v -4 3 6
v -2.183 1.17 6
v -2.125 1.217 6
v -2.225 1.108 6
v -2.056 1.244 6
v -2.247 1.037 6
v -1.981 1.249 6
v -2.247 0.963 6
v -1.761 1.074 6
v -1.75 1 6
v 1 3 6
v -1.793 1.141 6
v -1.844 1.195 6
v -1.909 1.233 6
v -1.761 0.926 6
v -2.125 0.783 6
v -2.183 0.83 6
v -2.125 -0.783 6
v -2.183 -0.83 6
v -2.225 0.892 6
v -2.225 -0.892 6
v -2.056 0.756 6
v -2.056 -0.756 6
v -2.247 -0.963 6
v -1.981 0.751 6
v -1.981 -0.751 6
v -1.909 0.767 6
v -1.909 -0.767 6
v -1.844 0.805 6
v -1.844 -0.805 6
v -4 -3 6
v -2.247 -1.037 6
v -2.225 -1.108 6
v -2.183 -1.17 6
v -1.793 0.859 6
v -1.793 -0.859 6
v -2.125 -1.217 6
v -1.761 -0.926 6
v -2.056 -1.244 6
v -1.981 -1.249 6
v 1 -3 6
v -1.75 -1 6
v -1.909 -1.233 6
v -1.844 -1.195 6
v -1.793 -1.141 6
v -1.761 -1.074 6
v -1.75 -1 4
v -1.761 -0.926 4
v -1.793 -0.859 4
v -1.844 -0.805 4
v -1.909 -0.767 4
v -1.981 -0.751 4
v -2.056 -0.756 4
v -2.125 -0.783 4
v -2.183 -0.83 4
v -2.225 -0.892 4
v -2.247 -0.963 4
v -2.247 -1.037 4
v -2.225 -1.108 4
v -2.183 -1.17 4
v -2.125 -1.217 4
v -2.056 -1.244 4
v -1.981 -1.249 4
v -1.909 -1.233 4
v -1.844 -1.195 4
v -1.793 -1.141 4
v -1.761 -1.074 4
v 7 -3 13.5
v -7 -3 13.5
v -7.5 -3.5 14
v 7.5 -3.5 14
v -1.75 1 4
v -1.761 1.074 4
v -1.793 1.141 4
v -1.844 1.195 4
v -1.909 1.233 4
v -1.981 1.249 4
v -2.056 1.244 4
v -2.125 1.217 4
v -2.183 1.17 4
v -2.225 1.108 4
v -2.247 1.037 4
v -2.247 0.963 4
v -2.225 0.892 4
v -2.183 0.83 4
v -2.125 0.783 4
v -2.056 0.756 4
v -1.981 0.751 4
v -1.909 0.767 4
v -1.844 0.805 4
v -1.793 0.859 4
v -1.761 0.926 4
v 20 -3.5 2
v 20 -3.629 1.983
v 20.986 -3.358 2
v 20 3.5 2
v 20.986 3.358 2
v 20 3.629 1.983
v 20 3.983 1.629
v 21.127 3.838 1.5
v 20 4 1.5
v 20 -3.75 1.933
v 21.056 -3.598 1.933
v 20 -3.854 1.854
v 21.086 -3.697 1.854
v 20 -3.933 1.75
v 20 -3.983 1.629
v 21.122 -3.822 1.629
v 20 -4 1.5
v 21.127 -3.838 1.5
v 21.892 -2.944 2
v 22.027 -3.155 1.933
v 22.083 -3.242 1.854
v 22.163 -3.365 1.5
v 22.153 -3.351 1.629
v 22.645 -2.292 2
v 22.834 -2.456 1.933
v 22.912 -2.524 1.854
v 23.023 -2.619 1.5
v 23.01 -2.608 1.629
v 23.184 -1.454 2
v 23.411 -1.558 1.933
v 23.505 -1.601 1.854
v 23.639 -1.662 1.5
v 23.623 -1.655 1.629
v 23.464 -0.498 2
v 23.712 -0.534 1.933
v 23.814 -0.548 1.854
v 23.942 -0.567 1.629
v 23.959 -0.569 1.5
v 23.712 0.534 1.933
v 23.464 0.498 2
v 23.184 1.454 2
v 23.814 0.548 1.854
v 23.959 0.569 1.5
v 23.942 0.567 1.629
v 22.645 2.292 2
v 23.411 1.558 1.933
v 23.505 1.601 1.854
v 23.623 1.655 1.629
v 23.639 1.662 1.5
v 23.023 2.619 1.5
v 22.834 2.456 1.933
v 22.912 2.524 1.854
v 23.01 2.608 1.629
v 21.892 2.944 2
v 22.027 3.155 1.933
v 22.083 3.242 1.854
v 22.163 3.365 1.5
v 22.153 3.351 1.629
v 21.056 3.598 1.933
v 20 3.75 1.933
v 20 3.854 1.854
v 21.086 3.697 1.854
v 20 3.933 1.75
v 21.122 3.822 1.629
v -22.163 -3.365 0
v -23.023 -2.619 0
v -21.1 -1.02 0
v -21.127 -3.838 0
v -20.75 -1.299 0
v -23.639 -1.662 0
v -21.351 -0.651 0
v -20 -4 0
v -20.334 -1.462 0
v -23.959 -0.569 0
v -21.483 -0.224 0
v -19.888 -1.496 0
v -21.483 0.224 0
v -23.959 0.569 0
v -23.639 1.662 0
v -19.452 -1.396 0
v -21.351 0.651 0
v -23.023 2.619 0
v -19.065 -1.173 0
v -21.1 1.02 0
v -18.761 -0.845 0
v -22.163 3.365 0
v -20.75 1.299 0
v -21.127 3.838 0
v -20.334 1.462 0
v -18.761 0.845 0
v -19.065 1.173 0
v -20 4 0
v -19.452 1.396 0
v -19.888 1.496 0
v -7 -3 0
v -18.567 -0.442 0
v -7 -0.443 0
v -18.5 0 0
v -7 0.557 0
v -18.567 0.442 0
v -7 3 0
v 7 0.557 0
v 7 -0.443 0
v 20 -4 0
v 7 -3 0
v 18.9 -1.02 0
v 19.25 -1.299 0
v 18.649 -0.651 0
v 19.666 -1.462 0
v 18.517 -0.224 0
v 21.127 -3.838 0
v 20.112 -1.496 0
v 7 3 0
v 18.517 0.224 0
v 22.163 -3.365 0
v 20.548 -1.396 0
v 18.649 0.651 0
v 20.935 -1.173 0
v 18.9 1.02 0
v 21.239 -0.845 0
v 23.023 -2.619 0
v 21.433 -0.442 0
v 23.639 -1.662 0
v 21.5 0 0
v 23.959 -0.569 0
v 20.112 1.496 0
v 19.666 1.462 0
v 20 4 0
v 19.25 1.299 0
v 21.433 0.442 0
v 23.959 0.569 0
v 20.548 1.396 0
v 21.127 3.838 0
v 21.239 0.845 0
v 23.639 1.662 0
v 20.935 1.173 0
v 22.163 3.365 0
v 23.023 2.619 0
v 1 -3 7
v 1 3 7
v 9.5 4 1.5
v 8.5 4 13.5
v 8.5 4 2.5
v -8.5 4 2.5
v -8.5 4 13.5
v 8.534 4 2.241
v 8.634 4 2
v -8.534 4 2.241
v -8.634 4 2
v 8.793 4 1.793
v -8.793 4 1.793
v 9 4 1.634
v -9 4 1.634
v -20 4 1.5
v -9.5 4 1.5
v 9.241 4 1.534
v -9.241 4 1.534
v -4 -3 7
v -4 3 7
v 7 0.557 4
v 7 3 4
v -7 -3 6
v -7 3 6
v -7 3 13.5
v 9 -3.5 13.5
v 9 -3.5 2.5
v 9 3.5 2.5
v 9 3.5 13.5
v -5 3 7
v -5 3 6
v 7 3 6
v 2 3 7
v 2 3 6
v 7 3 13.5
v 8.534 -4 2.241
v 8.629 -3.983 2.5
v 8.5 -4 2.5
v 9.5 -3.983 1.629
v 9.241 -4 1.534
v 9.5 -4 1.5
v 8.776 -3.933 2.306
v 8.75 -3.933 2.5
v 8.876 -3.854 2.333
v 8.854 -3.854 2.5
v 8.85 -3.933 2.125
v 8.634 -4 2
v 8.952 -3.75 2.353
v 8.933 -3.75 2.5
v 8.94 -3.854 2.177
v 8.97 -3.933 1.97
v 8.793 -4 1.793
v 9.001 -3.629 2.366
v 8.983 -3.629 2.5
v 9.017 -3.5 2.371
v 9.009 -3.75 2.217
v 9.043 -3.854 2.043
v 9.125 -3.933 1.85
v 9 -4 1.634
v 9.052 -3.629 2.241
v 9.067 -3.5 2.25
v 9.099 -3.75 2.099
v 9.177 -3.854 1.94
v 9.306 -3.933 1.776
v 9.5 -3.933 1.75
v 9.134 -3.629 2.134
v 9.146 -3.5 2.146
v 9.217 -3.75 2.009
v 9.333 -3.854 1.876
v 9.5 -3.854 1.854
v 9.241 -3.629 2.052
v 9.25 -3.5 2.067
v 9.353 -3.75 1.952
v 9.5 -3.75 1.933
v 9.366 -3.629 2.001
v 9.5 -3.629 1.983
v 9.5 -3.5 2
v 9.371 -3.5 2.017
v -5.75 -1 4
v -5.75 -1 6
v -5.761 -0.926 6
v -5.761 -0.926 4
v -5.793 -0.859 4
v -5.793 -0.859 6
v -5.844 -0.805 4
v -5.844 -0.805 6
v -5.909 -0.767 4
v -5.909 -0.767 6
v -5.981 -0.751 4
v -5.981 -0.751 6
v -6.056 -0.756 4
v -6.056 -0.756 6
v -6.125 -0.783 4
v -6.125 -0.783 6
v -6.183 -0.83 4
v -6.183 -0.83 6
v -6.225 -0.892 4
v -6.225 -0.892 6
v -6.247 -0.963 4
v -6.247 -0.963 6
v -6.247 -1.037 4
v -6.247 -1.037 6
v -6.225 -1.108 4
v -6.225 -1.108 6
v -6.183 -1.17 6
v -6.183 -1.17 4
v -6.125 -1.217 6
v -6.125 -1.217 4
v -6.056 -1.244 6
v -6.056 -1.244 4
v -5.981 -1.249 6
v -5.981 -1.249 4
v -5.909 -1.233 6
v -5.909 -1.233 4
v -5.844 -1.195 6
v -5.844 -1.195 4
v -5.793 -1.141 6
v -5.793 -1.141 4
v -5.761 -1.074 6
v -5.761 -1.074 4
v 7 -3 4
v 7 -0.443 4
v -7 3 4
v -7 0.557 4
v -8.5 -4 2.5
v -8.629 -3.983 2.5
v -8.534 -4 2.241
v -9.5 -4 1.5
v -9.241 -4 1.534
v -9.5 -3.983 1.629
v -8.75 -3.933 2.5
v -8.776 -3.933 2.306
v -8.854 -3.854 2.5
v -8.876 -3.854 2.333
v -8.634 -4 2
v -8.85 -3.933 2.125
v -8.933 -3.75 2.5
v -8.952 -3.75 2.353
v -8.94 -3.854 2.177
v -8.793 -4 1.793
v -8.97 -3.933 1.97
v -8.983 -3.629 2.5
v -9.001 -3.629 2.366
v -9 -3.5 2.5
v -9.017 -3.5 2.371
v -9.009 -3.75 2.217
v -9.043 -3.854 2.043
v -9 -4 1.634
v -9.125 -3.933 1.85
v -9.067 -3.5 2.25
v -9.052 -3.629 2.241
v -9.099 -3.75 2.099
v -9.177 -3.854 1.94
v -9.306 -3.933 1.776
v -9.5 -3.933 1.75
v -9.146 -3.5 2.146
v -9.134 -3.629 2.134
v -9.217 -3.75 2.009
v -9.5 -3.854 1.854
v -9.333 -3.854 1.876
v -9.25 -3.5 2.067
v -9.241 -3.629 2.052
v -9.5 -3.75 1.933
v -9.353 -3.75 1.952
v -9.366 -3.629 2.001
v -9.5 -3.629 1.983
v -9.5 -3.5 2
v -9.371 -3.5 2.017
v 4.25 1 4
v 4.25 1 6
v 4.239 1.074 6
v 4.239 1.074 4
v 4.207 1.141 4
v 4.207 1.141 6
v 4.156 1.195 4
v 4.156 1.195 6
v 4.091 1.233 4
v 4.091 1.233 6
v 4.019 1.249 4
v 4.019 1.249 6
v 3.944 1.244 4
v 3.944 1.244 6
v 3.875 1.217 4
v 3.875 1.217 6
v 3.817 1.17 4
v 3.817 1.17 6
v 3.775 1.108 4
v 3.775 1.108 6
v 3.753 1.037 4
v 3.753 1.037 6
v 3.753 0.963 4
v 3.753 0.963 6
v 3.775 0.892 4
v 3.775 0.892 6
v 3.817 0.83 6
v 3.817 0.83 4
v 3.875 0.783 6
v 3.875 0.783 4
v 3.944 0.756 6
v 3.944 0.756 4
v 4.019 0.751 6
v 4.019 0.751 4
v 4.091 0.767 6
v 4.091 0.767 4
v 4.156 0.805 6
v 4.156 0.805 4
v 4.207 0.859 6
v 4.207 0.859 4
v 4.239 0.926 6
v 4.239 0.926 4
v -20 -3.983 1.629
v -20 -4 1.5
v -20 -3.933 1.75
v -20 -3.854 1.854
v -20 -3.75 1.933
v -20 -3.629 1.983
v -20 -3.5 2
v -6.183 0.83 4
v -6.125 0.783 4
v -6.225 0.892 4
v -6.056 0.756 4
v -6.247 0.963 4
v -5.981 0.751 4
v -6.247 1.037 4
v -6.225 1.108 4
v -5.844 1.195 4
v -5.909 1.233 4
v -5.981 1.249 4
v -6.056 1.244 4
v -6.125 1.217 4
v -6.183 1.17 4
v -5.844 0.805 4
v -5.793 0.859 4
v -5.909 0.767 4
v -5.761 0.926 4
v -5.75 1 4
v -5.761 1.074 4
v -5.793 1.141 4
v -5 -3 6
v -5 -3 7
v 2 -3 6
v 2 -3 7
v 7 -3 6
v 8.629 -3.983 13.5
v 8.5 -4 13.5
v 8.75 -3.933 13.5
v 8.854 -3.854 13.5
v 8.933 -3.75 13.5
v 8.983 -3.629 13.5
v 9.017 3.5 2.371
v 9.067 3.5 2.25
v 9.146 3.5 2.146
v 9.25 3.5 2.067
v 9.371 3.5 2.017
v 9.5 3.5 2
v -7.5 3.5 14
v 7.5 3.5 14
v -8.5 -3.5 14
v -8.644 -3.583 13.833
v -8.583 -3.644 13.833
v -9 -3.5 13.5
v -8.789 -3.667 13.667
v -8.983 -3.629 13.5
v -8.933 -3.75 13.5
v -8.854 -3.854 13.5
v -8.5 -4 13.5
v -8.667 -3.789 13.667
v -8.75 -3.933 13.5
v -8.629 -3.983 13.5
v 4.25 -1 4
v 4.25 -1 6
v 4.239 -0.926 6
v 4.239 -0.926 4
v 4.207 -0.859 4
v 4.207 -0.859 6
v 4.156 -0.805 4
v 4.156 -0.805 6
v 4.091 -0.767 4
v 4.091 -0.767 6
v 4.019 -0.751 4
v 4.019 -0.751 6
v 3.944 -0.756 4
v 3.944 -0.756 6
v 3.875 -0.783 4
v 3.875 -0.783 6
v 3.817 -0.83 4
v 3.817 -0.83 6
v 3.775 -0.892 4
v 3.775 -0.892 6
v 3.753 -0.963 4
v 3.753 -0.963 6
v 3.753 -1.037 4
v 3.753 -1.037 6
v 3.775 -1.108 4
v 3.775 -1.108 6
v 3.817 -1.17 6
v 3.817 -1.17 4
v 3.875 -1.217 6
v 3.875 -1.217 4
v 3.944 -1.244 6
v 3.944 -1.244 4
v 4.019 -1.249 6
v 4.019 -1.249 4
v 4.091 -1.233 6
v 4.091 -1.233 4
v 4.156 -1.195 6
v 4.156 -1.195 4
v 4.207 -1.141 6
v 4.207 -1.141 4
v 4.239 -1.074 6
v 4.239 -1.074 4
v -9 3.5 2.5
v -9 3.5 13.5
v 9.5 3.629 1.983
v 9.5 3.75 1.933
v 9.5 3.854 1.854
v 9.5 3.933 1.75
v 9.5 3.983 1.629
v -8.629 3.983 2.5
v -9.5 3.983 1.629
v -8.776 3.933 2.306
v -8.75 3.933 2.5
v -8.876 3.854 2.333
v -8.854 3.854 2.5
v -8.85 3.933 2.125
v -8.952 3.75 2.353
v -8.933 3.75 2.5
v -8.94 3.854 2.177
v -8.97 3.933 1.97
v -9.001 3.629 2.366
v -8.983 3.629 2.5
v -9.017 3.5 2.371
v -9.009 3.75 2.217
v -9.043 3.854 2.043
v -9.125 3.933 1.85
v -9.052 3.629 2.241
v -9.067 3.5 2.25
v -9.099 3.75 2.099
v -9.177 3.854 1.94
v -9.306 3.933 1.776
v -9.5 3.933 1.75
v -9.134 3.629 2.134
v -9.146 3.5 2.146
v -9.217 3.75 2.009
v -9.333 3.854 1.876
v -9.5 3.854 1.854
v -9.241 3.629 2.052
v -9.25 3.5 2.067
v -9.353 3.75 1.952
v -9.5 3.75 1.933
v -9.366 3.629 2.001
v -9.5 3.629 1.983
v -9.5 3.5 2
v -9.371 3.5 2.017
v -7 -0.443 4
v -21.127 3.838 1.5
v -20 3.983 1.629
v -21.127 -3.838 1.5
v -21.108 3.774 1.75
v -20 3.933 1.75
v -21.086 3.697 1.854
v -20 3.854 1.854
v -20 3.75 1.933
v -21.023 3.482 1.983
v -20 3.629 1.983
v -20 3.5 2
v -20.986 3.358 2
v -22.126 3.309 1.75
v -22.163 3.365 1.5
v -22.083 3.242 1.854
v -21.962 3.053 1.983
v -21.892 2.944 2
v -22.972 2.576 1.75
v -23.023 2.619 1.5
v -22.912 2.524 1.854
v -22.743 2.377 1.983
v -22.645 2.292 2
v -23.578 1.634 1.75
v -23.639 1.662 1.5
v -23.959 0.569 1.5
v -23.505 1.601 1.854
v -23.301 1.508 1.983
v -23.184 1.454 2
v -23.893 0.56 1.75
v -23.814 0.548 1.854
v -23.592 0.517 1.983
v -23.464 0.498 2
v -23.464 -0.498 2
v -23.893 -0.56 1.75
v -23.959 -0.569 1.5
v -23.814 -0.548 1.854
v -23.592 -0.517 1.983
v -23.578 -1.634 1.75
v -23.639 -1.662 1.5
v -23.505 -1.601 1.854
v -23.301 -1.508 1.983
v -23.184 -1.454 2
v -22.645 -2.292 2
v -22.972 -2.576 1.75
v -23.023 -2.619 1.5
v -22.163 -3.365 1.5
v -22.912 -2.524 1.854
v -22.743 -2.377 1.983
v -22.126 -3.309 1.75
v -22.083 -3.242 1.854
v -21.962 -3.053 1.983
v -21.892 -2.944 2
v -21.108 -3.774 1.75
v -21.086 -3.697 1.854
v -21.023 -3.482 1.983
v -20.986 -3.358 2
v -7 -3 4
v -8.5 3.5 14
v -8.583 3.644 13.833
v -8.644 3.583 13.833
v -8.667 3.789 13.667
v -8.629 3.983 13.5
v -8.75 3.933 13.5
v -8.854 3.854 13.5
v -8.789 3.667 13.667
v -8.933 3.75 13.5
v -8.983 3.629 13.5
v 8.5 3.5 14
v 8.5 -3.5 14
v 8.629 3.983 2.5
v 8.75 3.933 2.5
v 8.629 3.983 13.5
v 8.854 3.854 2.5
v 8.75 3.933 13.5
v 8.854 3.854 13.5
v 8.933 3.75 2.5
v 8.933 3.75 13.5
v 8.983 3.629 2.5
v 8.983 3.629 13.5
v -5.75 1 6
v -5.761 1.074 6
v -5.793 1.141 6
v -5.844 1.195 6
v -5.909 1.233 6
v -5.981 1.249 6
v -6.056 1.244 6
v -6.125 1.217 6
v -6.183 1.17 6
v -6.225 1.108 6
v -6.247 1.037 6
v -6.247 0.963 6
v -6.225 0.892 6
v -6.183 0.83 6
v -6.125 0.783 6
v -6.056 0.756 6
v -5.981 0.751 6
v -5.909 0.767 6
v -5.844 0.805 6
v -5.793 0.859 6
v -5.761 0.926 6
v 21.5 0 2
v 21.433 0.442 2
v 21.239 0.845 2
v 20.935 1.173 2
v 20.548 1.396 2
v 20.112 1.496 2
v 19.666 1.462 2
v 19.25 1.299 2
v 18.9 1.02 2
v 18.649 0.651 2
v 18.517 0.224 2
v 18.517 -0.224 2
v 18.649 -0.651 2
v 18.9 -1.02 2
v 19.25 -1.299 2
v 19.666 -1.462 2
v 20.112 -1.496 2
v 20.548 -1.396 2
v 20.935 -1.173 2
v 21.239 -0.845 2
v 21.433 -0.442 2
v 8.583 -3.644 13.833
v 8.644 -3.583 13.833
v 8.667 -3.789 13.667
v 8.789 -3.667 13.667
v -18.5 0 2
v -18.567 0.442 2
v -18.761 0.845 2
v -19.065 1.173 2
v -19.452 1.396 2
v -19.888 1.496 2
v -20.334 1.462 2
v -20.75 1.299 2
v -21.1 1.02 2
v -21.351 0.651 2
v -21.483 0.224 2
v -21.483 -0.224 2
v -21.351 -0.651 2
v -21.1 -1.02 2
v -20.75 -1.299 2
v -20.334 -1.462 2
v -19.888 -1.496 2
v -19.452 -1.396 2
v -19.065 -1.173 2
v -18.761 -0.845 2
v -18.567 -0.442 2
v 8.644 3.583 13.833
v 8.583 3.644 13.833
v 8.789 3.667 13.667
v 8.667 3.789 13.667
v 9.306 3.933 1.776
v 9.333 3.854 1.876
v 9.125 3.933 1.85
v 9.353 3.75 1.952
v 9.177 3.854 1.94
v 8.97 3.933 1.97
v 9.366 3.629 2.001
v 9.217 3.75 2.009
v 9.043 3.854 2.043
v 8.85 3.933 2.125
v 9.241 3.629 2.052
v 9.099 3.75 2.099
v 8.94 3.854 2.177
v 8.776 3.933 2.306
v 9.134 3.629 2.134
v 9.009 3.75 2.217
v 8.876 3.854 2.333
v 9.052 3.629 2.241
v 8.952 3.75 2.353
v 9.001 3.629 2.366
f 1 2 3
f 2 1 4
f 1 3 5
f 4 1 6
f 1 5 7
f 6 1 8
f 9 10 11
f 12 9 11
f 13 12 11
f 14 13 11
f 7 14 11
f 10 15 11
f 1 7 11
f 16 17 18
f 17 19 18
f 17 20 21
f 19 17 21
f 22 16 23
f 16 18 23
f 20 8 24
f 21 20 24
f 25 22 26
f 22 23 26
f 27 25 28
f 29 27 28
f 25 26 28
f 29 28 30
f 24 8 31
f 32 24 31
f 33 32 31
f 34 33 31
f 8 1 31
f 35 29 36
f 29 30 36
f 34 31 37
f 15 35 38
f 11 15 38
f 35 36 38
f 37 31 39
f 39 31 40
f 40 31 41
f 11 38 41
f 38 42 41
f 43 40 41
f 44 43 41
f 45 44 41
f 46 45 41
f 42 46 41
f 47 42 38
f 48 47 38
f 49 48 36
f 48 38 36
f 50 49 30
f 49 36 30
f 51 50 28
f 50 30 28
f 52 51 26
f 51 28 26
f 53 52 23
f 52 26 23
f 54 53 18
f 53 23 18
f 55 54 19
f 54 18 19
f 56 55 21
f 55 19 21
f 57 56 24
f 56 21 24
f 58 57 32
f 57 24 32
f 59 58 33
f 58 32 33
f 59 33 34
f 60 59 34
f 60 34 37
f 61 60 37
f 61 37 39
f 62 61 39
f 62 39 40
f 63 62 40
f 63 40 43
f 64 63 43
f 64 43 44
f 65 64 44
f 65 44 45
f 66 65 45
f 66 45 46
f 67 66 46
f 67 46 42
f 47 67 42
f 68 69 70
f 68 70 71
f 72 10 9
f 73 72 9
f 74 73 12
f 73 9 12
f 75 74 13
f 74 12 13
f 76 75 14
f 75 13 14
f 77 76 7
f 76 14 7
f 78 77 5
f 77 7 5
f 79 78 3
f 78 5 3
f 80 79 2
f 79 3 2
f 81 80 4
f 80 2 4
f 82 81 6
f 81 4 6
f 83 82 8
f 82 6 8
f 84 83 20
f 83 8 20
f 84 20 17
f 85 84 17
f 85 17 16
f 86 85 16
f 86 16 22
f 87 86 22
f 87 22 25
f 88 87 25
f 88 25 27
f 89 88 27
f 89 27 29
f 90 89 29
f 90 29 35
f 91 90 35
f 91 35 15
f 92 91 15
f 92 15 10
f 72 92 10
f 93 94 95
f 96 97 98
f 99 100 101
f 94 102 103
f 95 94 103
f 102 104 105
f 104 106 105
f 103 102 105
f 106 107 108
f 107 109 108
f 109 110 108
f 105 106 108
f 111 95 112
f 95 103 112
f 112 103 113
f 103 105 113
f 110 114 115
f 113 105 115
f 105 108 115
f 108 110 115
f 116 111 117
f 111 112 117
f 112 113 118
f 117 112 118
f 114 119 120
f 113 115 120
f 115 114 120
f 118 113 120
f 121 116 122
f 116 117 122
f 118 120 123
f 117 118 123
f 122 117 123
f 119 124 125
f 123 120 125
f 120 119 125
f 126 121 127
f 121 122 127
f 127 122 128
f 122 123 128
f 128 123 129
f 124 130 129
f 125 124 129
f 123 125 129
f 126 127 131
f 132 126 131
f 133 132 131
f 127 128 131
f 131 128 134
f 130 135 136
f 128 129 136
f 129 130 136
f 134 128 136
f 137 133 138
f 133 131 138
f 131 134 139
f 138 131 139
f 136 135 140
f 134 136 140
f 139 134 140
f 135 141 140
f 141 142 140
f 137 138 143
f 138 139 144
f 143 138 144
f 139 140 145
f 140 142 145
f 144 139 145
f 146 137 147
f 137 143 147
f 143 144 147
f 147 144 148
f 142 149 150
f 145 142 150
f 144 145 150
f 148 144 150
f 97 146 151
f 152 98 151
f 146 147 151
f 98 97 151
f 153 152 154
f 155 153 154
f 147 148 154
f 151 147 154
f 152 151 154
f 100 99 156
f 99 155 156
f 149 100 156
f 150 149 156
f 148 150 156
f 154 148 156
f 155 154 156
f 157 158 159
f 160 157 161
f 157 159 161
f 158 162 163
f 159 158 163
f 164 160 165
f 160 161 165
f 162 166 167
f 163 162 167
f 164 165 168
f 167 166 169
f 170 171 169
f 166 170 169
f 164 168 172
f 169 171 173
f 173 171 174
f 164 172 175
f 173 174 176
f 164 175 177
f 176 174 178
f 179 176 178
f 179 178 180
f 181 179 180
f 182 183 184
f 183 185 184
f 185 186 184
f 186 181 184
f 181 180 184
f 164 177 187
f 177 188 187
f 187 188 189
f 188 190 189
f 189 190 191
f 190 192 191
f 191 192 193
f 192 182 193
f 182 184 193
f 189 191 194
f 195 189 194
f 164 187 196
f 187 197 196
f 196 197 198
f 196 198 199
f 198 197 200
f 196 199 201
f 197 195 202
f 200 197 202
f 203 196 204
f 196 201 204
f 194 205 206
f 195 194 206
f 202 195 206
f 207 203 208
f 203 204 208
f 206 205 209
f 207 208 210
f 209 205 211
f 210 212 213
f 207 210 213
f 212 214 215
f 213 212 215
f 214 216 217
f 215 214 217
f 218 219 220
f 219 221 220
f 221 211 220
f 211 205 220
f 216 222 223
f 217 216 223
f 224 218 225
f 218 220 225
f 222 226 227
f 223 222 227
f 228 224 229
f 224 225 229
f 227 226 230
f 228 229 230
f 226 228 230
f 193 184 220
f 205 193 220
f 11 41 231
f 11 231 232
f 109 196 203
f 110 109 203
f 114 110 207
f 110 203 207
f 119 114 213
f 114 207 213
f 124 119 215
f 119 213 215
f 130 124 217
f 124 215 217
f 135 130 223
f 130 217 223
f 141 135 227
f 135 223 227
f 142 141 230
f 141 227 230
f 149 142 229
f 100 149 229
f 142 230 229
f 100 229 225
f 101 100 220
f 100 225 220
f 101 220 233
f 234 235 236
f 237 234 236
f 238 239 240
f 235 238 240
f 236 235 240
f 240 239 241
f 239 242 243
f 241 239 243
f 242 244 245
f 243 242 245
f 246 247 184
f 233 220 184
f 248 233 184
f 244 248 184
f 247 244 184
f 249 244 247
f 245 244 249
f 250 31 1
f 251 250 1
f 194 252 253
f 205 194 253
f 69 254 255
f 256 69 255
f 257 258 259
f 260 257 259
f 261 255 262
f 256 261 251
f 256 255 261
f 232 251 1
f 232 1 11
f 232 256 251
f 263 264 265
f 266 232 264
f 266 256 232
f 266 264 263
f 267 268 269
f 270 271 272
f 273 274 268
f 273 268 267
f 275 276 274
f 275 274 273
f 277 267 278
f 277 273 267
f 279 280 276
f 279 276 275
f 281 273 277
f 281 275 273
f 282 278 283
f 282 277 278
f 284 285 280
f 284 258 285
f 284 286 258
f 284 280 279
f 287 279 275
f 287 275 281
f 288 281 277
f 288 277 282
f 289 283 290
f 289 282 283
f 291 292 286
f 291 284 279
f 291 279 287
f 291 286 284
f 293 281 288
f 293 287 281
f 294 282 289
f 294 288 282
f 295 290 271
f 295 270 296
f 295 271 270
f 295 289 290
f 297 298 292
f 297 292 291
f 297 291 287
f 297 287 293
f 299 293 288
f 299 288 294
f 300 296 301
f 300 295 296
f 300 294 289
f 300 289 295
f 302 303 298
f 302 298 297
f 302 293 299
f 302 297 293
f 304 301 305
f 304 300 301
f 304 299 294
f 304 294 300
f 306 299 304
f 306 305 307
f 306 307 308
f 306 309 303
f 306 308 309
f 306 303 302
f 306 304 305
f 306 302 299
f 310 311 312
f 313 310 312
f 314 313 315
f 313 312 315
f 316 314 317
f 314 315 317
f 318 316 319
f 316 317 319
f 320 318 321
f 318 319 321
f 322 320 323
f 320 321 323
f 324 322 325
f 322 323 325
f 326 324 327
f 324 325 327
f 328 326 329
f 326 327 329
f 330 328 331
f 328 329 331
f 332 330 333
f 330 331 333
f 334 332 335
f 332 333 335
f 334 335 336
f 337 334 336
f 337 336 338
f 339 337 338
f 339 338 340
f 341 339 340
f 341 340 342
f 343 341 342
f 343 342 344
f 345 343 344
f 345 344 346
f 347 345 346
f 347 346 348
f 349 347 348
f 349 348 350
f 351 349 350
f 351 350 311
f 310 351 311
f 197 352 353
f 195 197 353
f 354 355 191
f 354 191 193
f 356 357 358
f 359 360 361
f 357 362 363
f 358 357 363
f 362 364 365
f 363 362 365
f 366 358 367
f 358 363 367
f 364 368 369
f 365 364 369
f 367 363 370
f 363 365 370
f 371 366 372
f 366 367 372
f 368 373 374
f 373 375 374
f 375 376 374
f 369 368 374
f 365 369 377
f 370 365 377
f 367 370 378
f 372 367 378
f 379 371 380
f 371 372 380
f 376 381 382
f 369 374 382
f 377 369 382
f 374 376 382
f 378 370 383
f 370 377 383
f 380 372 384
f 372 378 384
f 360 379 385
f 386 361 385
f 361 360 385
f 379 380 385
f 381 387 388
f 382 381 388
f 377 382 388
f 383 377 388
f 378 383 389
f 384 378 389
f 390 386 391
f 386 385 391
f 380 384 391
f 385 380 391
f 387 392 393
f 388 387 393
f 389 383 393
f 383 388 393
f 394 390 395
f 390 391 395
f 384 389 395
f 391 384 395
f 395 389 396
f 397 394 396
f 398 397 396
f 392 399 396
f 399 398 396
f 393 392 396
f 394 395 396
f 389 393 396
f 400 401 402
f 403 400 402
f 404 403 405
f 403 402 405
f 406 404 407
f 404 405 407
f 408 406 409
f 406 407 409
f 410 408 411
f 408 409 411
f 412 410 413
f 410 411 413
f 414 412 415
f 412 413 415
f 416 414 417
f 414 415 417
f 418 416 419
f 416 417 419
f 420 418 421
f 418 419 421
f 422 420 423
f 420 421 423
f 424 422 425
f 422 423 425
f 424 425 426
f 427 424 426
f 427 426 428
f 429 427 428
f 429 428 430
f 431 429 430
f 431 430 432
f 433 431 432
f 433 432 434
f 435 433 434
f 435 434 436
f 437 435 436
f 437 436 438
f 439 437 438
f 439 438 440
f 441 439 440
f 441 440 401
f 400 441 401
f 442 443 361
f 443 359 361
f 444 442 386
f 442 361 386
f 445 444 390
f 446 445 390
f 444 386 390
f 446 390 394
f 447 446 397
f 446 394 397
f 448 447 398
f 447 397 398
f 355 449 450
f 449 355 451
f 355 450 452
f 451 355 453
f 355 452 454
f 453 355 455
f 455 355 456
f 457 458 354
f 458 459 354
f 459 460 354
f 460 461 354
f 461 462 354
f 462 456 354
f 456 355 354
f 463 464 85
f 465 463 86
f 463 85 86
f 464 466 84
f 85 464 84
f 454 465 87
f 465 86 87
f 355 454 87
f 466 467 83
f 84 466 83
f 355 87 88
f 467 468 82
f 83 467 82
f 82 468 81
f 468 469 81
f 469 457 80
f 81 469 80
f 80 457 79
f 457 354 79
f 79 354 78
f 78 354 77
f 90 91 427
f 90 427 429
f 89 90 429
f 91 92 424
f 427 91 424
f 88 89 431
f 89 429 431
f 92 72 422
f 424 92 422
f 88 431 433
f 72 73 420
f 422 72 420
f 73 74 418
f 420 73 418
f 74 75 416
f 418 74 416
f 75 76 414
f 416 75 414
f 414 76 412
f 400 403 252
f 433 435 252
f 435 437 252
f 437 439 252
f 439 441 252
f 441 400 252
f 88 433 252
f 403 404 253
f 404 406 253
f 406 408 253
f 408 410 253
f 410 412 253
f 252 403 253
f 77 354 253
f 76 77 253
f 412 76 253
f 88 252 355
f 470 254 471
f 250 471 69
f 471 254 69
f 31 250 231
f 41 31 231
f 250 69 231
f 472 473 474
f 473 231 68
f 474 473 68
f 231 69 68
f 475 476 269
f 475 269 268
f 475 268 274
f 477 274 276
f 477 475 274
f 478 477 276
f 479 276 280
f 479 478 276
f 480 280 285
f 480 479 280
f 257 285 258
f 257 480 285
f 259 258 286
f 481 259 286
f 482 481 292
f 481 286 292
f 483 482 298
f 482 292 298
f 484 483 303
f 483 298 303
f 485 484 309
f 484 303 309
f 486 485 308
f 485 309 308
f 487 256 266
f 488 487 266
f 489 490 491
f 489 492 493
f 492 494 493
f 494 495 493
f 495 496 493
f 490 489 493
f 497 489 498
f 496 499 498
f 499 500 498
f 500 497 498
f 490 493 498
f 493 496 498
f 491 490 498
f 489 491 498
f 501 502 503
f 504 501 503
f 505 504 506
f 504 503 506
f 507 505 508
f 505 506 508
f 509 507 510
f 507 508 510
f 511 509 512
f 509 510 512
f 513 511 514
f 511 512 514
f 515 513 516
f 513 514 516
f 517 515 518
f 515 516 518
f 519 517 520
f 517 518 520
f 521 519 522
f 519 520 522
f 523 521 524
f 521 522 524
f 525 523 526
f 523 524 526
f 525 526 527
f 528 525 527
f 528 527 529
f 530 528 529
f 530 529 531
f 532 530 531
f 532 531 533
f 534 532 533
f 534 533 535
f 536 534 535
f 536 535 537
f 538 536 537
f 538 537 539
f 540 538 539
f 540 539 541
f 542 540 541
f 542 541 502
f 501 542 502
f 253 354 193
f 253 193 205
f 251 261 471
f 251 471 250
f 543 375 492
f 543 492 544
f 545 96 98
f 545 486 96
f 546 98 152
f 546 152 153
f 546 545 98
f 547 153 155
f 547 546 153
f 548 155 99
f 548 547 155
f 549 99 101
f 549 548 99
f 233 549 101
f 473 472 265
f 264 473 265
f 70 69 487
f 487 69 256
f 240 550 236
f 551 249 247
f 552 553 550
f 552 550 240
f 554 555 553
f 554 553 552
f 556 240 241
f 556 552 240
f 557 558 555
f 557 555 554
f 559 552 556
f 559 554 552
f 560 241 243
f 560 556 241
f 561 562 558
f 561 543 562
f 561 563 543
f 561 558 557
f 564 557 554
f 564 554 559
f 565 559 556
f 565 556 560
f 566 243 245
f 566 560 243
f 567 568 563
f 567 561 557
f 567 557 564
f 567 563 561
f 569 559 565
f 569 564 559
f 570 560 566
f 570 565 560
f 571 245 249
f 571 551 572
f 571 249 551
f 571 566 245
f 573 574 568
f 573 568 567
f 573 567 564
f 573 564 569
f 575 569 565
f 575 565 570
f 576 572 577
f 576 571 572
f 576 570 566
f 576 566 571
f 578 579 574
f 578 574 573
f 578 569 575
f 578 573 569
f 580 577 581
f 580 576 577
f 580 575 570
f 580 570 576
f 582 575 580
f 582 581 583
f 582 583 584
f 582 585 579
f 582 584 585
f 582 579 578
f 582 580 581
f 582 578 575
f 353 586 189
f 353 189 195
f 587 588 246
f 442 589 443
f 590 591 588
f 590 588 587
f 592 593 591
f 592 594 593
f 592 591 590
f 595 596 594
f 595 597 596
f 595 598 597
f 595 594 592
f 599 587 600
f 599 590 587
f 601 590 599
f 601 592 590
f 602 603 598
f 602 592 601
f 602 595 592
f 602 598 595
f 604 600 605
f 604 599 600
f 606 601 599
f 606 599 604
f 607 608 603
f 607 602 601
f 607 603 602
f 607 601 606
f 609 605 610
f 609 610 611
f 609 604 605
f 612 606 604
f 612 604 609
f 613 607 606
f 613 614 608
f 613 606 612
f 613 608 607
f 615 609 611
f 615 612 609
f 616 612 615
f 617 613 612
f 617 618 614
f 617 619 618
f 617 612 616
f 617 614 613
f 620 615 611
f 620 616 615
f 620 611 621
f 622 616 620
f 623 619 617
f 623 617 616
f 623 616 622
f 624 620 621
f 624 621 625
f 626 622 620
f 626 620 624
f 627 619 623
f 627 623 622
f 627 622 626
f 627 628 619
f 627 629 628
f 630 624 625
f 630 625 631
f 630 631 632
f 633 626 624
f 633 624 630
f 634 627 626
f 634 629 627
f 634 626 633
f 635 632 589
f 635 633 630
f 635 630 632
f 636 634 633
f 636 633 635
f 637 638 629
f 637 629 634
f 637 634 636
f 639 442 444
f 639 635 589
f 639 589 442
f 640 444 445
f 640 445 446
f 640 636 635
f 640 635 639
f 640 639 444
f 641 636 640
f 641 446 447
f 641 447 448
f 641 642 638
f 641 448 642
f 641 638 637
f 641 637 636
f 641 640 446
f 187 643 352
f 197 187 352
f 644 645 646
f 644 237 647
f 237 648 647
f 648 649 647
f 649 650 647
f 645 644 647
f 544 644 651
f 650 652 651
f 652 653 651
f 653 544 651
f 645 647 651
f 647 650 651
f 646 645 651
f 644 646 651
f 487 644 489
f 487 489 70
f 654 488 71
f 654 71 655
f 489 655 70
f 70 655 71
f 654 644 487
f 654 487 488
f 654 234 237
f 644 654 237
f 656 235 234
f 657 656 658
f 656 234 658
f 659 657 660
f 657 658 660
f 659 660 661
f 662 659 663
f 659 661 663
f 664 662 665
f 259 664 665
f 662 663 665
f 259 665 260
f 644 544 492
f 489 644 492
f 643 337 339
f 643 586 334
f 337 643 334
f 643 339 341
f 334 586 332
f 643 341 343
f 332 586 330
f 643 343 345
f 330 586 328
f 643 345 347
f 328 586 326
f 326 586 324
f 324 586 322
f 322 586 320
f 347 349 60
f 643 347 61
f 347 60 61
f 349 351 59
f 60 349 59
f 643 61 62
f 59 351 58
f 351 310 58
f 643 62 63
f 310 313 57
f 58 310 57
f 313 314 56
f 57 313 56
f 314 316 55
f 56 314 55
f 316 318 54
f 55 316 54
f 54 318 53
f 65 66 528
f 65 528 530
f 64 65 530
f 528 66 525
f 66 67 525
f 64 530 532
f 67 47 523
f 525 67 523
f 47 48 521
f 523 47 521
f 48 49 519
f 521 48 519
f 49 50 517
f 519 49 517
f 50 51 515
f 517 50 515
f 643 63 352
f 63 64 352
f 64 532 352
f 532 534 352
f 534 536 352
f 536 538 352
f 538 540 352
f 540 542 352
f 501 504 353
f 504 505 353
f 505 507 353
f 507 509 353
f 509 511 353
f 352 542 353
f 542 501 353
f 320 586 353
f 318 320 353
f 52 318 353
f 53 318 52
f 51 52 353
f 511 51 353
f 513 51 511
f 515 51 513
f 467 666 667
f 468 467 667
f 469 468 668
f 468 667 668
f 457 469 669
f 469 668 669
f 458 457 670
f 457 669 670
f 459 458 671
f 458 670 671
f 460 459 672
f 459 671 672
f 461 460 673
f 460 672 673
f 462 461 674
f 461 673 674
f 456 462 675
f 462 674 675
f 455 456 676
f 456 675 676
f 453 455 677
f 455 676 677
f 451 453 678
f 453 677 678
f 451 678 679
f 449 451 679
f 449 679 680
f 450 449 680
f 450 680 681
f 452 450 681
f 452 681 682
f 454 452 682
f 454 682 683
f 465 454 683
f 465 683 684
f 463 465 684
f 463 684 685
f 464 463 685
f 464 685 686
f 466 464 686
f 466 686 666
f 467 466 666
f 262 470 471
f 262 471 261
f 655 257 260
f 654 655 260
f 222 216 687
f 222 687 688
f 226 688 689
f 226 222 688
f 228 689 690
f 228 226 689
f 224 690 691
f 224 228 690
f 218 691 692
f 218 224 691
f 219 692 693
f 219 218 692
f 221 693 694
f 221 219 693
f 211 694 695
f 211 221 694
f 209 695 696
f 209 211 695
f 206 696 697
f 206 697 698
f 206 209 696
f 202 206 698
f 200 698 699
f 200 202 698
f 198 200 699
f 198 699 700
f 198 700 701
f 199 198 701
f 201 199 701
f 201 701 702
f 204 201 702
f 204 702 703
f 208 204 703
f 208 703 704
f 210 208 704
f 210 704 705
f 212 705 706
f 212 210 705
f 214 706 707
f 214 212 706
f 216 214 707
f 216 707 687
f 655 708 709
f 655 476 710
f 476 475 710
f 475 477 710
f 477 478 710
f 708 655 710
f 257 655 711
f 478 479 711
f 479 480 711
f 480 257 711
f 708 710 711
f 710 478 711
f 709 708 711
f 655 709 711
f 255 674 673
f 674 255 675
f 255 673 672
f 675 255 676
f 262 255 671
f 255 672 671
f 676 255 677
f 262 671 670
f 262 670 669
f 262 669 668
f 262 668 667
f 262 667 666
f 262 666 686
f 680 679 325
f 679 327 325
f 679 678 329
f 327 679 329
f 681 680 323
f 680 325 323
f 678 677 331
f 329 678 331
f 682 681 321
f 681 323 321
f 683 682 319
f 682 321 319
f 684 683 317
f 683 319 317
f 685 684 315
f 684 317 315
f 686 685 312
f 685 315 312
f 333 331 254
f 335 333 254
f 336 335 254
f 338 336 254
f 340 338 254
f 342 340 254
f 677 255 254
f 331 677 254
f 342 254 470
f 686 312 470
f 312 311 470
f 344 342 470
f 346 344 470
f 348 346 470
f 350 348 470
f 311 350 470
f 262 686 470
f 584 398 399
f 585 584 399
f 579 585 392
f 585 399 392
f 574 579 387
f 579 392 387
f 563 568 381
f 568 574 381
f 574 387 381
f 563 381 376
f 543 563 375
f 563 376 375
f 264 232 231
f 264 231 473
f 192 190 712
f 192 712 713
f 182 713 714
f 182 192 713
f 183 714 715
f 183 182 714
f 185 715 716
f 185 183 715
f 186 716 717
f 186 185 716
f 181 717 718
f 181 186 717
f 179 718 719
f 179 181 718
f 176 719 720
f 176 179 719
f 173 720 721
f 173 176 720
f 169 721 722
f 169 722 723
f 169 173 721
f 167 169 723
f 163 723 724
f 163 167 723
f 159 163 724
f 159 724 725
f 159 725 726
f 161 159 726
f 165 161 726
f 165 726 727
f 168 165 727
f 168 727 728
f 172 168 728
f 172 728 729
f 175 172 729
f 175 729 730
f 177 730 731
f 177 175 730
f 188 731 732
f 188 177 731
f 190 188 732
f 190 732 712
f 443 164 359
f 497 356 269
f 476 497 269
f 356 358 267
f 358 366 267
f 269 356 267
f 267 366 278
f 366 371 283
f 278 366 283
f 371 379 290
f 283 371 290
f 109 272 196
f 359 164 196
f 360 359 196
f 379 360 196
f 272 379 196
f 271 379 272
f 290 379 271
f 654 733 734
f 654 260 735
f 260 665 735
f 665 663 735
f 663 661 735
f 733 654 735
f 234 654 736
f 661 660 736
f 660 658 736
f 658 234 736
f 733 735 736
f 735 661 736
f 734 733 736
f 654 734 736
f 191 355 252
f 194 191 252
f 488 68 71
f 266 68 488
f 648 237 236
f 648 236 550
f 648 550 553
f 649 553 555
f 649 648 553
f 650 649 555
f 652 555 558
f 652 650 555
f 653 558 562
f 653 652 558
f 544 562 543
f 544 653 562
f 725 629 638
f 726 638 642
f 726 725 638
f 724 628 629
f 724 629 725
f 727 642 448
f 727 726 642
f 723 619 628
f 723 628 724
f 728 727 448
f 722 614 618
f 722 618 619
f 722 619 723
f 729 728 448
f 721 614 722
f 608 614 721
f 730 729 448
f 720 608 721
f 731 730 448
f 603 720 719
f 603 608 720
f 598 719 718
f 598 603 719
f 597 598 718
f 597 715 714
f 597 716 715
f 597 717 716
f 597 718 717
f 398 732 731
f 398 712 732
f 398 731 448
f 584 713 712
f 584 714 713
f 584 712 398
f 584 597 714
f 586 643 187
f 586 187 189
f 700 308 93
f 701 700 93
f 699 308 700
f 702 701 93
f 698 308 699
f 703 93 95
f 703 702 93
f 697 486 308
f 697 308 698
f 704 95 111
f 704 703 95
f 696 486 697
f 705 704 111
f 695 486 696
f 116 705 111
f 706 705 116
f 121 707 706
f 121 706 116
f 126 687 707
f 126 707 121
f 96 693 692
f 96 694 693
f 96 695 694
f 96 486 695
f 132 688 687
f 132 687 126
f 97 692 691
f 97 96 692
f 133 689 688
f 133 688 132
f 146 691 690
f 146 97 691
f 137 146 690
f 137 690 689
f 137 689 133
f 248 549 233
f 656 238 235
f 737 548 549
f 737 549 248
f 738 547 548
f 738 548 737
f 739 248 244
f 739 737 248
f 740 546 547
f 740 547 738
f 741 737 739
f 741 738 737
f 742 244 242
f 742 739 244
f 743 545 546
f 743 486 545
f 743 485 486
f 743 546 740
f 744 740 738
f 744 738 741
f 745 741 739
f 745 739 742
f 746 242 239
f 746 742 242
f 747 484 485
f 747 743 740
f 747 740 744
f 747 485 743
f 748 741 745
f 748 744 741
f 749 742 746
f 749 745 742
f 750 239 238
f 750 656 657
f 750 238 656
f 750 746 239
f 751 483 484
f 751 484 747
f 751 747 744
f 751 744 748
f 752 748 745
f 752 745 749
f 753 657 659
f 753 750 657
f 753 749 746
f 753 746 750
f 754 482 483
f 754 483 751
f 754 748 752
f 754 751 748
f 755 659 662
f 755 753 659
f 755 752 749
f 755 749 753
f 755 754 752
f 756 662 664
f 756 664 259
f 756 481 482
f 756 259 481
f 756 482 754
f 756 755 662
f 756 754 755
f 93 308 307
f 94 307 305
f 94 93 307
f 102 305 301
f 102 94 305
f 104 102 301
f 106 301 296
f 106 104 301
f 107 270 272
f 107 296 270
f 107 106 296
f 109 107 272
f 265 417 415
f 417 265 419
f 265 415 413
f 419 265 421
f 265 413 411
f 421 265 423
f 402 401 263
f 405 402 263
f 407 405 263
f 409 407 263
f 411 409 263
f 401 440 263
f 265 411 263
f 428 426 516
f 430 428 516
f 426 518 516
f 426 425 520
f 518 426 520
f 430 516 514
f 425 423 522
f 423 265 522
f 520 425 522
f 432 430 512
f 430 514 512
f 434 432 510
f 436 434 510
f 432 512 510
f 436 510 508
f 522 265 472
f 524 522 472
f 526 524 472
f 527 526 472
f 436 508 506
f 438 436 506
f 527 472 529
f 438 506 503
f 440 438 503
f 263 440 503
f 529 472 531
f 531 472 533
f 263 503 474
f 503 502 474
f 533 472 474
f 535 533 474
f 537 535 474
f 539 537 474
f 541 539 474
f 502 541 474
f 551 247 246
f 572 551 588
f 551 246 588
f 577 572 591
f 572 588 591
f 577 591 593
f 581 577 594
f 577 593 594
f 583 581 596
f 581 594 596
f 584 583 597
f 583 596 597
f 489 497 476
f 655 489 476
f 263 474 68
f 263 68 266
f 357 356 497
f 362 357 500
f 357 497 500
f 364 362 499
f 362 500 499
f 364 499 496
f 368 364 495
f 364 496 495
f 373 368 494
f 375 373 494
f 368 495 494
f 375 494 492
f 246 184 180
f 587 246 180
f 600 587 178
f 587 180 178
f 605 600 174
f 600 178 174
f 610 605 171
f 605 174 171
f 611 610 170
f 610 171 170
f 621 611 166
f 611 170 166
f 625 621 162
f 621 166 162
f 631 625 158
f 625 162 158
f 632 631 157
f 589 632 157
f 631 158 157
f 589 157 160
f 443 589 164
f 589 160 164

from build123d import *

# Parameters (mm, degrees)
F0_R          = 1.5
F1_DEPTH      = 2
F2_W          = 18
F2_H          = 8
F2_W_2        = 14
F2_H_2        = 6
F3_DEPTH      = 14
F4_R          = 0.5
F5_SIZE       = 0.49999
F6_W          = 14
F6_H          = 6
F7_DEPTH      = 2.001
F8_W          = 17
F8_H          = 2
F9_DEPTH      = 3
F9_DEPTH_BACK = 3
F10_W         = 1
F10_H         = 6
F11_DEPTH     = 1
F12_R         = 0.25
F13_DEPTH     = 6.001
F14_W         = 14
F14_H         = 1
F15_DEPTH     = 4


# Not quite as in the source:
# - a fillet or chamfer is up to 0.001 mm smaller than in the source, because OpenCascade refuses the exact size


with BuildPart() as f1:
    # F0 (on Top) → F1 (new body)
    with BuildSketch(Plane.XY):
        with BuildLine():
            Line((20, 4), (0, 4))
            Line((0, 4), (-20, 4))
            ThreePointArc((-20, 4), (-24, 0), (-20, -4))
            Line((-20, -4), (0, -4))
            Line((0, -4), (20, -4))
            ThreePointArc((20, -4), (24, 0), (20, 4))
        make_face()
        with Locations((-20, 0)):
            Circle(F0_R, mode=Mode.SUBTRACT)
        with Locations((20, 0)):
            Circle(F0_R, mode=Mode.SUBTRACT)
    extrude(amount=F1_DEPTH)

    # F2 (on Top) → F3 (join)
    with BuildSketch(Plane.XY):
        Rectangle(F2_W, F2_H)
        Rectangle(F2_W_2, F2_H_2, mode=Mode.SUBTRACT)
    extrude(amount=F3_DEPTH)

    # F4
    f4_edges = [f1.edges().sort_by_distance(p)[0] for p in [
        (9, 0, 2),
        (-9, 0, 2),
        (-9, -4, 8),
        (9, -4, 8),
        (24, 0, 2),
        (14.5, -4, 2),
        (14.5, 4, 2),
        (9, 4, 8),
        (-9, 4, 8),
        (-14.5, -4, 2),
        (-24, 0, 2),
        (-14.5, 4, 2),
    ]]
    fillet(f4_edges, radius=F4_R)

    # F5 (size 0.5 in the source; OpenCascade refuses exactly that, so slightly less here)
    f5_edges = [f1.edges().sort_by_distance(p)[0] for p in [
        (7, 0, 14),
        (0, 3, 14),
        (-7, 0, 14),
        (0, -3, 14),
        (0, -4, 14),
        (0, 4, 14),
        (-8.853553, -3.853553, 14),
        (8.853553, -3.853553, 14),
        (-9, 0, 14),
        (9, 0, 14),
        (-8.853553, 3.853553, 14),
        (8.853553, 3.853553, 14),
    ]]
    chamfer(f5_edges, length=F5_SIZE)

    # F6 (on face) → F7 (cut, through all)
    with BuildSketch(Plane.XY.offset(2)):
        Rectangle(F6_W, F6_H)
    extrude(amount=-F7_DEPTH, mode=Mode.SUBTRACT)

    # F8 (on Front) → F9 (join, two sides)
    with BuildSketch(Plane.XZ) as f9_sk:
        with Locations((0, 5)):
            Rectangle(F8_W, F8_H)
    extrude(amount=-F9_DEPTH)
    extrude(f9_sk.sketch, amount=F9_DEPTH_BACK)

    # F10 (on face) → F11 (join)
    with BuildSketch(Plane.XY.offset(6)):
        with Locations((1.5, 0)):
            Rectangle(F10_W, F10_H)
        with Locations((-4.5, 0)):
            Rectangle(F10_W, F10_H)
    extrude(amount=F11_DEPTH)

    # F12 (on face) → F13 (cut, through all)
    with BuildSketch(Plane.XY.offset(6)):
        with Locations((-2, 1)):
            Circle(F12_R)
        with Locations((-2, -1)):
            Circle(F12_R)
        with Locations((4, 1)):
            Circle(F12_R)
        with Locations((4, -1)):
            Circle(F12_R)
        with Locations((-6, 1)):
            Circle(F12_R)
        with Locations((-6, -1)):
            Circle(F12_R)
    extrude(amount=-F13_DEPTH, mode=Mode.SUBTRACT)

    # F14 (on face) → F15 (join, through all)
    with BuildSketch(Plane(origin=(0, 0, 4), x_dir=(1, 0, 0), z_dir=(0, 0, -1))):
        with Locations((0, -0.056592231)):
            Rectangle(F14_W, F14_H)
    extrude(amount=F15_DEPTH)


solid = f1.part
